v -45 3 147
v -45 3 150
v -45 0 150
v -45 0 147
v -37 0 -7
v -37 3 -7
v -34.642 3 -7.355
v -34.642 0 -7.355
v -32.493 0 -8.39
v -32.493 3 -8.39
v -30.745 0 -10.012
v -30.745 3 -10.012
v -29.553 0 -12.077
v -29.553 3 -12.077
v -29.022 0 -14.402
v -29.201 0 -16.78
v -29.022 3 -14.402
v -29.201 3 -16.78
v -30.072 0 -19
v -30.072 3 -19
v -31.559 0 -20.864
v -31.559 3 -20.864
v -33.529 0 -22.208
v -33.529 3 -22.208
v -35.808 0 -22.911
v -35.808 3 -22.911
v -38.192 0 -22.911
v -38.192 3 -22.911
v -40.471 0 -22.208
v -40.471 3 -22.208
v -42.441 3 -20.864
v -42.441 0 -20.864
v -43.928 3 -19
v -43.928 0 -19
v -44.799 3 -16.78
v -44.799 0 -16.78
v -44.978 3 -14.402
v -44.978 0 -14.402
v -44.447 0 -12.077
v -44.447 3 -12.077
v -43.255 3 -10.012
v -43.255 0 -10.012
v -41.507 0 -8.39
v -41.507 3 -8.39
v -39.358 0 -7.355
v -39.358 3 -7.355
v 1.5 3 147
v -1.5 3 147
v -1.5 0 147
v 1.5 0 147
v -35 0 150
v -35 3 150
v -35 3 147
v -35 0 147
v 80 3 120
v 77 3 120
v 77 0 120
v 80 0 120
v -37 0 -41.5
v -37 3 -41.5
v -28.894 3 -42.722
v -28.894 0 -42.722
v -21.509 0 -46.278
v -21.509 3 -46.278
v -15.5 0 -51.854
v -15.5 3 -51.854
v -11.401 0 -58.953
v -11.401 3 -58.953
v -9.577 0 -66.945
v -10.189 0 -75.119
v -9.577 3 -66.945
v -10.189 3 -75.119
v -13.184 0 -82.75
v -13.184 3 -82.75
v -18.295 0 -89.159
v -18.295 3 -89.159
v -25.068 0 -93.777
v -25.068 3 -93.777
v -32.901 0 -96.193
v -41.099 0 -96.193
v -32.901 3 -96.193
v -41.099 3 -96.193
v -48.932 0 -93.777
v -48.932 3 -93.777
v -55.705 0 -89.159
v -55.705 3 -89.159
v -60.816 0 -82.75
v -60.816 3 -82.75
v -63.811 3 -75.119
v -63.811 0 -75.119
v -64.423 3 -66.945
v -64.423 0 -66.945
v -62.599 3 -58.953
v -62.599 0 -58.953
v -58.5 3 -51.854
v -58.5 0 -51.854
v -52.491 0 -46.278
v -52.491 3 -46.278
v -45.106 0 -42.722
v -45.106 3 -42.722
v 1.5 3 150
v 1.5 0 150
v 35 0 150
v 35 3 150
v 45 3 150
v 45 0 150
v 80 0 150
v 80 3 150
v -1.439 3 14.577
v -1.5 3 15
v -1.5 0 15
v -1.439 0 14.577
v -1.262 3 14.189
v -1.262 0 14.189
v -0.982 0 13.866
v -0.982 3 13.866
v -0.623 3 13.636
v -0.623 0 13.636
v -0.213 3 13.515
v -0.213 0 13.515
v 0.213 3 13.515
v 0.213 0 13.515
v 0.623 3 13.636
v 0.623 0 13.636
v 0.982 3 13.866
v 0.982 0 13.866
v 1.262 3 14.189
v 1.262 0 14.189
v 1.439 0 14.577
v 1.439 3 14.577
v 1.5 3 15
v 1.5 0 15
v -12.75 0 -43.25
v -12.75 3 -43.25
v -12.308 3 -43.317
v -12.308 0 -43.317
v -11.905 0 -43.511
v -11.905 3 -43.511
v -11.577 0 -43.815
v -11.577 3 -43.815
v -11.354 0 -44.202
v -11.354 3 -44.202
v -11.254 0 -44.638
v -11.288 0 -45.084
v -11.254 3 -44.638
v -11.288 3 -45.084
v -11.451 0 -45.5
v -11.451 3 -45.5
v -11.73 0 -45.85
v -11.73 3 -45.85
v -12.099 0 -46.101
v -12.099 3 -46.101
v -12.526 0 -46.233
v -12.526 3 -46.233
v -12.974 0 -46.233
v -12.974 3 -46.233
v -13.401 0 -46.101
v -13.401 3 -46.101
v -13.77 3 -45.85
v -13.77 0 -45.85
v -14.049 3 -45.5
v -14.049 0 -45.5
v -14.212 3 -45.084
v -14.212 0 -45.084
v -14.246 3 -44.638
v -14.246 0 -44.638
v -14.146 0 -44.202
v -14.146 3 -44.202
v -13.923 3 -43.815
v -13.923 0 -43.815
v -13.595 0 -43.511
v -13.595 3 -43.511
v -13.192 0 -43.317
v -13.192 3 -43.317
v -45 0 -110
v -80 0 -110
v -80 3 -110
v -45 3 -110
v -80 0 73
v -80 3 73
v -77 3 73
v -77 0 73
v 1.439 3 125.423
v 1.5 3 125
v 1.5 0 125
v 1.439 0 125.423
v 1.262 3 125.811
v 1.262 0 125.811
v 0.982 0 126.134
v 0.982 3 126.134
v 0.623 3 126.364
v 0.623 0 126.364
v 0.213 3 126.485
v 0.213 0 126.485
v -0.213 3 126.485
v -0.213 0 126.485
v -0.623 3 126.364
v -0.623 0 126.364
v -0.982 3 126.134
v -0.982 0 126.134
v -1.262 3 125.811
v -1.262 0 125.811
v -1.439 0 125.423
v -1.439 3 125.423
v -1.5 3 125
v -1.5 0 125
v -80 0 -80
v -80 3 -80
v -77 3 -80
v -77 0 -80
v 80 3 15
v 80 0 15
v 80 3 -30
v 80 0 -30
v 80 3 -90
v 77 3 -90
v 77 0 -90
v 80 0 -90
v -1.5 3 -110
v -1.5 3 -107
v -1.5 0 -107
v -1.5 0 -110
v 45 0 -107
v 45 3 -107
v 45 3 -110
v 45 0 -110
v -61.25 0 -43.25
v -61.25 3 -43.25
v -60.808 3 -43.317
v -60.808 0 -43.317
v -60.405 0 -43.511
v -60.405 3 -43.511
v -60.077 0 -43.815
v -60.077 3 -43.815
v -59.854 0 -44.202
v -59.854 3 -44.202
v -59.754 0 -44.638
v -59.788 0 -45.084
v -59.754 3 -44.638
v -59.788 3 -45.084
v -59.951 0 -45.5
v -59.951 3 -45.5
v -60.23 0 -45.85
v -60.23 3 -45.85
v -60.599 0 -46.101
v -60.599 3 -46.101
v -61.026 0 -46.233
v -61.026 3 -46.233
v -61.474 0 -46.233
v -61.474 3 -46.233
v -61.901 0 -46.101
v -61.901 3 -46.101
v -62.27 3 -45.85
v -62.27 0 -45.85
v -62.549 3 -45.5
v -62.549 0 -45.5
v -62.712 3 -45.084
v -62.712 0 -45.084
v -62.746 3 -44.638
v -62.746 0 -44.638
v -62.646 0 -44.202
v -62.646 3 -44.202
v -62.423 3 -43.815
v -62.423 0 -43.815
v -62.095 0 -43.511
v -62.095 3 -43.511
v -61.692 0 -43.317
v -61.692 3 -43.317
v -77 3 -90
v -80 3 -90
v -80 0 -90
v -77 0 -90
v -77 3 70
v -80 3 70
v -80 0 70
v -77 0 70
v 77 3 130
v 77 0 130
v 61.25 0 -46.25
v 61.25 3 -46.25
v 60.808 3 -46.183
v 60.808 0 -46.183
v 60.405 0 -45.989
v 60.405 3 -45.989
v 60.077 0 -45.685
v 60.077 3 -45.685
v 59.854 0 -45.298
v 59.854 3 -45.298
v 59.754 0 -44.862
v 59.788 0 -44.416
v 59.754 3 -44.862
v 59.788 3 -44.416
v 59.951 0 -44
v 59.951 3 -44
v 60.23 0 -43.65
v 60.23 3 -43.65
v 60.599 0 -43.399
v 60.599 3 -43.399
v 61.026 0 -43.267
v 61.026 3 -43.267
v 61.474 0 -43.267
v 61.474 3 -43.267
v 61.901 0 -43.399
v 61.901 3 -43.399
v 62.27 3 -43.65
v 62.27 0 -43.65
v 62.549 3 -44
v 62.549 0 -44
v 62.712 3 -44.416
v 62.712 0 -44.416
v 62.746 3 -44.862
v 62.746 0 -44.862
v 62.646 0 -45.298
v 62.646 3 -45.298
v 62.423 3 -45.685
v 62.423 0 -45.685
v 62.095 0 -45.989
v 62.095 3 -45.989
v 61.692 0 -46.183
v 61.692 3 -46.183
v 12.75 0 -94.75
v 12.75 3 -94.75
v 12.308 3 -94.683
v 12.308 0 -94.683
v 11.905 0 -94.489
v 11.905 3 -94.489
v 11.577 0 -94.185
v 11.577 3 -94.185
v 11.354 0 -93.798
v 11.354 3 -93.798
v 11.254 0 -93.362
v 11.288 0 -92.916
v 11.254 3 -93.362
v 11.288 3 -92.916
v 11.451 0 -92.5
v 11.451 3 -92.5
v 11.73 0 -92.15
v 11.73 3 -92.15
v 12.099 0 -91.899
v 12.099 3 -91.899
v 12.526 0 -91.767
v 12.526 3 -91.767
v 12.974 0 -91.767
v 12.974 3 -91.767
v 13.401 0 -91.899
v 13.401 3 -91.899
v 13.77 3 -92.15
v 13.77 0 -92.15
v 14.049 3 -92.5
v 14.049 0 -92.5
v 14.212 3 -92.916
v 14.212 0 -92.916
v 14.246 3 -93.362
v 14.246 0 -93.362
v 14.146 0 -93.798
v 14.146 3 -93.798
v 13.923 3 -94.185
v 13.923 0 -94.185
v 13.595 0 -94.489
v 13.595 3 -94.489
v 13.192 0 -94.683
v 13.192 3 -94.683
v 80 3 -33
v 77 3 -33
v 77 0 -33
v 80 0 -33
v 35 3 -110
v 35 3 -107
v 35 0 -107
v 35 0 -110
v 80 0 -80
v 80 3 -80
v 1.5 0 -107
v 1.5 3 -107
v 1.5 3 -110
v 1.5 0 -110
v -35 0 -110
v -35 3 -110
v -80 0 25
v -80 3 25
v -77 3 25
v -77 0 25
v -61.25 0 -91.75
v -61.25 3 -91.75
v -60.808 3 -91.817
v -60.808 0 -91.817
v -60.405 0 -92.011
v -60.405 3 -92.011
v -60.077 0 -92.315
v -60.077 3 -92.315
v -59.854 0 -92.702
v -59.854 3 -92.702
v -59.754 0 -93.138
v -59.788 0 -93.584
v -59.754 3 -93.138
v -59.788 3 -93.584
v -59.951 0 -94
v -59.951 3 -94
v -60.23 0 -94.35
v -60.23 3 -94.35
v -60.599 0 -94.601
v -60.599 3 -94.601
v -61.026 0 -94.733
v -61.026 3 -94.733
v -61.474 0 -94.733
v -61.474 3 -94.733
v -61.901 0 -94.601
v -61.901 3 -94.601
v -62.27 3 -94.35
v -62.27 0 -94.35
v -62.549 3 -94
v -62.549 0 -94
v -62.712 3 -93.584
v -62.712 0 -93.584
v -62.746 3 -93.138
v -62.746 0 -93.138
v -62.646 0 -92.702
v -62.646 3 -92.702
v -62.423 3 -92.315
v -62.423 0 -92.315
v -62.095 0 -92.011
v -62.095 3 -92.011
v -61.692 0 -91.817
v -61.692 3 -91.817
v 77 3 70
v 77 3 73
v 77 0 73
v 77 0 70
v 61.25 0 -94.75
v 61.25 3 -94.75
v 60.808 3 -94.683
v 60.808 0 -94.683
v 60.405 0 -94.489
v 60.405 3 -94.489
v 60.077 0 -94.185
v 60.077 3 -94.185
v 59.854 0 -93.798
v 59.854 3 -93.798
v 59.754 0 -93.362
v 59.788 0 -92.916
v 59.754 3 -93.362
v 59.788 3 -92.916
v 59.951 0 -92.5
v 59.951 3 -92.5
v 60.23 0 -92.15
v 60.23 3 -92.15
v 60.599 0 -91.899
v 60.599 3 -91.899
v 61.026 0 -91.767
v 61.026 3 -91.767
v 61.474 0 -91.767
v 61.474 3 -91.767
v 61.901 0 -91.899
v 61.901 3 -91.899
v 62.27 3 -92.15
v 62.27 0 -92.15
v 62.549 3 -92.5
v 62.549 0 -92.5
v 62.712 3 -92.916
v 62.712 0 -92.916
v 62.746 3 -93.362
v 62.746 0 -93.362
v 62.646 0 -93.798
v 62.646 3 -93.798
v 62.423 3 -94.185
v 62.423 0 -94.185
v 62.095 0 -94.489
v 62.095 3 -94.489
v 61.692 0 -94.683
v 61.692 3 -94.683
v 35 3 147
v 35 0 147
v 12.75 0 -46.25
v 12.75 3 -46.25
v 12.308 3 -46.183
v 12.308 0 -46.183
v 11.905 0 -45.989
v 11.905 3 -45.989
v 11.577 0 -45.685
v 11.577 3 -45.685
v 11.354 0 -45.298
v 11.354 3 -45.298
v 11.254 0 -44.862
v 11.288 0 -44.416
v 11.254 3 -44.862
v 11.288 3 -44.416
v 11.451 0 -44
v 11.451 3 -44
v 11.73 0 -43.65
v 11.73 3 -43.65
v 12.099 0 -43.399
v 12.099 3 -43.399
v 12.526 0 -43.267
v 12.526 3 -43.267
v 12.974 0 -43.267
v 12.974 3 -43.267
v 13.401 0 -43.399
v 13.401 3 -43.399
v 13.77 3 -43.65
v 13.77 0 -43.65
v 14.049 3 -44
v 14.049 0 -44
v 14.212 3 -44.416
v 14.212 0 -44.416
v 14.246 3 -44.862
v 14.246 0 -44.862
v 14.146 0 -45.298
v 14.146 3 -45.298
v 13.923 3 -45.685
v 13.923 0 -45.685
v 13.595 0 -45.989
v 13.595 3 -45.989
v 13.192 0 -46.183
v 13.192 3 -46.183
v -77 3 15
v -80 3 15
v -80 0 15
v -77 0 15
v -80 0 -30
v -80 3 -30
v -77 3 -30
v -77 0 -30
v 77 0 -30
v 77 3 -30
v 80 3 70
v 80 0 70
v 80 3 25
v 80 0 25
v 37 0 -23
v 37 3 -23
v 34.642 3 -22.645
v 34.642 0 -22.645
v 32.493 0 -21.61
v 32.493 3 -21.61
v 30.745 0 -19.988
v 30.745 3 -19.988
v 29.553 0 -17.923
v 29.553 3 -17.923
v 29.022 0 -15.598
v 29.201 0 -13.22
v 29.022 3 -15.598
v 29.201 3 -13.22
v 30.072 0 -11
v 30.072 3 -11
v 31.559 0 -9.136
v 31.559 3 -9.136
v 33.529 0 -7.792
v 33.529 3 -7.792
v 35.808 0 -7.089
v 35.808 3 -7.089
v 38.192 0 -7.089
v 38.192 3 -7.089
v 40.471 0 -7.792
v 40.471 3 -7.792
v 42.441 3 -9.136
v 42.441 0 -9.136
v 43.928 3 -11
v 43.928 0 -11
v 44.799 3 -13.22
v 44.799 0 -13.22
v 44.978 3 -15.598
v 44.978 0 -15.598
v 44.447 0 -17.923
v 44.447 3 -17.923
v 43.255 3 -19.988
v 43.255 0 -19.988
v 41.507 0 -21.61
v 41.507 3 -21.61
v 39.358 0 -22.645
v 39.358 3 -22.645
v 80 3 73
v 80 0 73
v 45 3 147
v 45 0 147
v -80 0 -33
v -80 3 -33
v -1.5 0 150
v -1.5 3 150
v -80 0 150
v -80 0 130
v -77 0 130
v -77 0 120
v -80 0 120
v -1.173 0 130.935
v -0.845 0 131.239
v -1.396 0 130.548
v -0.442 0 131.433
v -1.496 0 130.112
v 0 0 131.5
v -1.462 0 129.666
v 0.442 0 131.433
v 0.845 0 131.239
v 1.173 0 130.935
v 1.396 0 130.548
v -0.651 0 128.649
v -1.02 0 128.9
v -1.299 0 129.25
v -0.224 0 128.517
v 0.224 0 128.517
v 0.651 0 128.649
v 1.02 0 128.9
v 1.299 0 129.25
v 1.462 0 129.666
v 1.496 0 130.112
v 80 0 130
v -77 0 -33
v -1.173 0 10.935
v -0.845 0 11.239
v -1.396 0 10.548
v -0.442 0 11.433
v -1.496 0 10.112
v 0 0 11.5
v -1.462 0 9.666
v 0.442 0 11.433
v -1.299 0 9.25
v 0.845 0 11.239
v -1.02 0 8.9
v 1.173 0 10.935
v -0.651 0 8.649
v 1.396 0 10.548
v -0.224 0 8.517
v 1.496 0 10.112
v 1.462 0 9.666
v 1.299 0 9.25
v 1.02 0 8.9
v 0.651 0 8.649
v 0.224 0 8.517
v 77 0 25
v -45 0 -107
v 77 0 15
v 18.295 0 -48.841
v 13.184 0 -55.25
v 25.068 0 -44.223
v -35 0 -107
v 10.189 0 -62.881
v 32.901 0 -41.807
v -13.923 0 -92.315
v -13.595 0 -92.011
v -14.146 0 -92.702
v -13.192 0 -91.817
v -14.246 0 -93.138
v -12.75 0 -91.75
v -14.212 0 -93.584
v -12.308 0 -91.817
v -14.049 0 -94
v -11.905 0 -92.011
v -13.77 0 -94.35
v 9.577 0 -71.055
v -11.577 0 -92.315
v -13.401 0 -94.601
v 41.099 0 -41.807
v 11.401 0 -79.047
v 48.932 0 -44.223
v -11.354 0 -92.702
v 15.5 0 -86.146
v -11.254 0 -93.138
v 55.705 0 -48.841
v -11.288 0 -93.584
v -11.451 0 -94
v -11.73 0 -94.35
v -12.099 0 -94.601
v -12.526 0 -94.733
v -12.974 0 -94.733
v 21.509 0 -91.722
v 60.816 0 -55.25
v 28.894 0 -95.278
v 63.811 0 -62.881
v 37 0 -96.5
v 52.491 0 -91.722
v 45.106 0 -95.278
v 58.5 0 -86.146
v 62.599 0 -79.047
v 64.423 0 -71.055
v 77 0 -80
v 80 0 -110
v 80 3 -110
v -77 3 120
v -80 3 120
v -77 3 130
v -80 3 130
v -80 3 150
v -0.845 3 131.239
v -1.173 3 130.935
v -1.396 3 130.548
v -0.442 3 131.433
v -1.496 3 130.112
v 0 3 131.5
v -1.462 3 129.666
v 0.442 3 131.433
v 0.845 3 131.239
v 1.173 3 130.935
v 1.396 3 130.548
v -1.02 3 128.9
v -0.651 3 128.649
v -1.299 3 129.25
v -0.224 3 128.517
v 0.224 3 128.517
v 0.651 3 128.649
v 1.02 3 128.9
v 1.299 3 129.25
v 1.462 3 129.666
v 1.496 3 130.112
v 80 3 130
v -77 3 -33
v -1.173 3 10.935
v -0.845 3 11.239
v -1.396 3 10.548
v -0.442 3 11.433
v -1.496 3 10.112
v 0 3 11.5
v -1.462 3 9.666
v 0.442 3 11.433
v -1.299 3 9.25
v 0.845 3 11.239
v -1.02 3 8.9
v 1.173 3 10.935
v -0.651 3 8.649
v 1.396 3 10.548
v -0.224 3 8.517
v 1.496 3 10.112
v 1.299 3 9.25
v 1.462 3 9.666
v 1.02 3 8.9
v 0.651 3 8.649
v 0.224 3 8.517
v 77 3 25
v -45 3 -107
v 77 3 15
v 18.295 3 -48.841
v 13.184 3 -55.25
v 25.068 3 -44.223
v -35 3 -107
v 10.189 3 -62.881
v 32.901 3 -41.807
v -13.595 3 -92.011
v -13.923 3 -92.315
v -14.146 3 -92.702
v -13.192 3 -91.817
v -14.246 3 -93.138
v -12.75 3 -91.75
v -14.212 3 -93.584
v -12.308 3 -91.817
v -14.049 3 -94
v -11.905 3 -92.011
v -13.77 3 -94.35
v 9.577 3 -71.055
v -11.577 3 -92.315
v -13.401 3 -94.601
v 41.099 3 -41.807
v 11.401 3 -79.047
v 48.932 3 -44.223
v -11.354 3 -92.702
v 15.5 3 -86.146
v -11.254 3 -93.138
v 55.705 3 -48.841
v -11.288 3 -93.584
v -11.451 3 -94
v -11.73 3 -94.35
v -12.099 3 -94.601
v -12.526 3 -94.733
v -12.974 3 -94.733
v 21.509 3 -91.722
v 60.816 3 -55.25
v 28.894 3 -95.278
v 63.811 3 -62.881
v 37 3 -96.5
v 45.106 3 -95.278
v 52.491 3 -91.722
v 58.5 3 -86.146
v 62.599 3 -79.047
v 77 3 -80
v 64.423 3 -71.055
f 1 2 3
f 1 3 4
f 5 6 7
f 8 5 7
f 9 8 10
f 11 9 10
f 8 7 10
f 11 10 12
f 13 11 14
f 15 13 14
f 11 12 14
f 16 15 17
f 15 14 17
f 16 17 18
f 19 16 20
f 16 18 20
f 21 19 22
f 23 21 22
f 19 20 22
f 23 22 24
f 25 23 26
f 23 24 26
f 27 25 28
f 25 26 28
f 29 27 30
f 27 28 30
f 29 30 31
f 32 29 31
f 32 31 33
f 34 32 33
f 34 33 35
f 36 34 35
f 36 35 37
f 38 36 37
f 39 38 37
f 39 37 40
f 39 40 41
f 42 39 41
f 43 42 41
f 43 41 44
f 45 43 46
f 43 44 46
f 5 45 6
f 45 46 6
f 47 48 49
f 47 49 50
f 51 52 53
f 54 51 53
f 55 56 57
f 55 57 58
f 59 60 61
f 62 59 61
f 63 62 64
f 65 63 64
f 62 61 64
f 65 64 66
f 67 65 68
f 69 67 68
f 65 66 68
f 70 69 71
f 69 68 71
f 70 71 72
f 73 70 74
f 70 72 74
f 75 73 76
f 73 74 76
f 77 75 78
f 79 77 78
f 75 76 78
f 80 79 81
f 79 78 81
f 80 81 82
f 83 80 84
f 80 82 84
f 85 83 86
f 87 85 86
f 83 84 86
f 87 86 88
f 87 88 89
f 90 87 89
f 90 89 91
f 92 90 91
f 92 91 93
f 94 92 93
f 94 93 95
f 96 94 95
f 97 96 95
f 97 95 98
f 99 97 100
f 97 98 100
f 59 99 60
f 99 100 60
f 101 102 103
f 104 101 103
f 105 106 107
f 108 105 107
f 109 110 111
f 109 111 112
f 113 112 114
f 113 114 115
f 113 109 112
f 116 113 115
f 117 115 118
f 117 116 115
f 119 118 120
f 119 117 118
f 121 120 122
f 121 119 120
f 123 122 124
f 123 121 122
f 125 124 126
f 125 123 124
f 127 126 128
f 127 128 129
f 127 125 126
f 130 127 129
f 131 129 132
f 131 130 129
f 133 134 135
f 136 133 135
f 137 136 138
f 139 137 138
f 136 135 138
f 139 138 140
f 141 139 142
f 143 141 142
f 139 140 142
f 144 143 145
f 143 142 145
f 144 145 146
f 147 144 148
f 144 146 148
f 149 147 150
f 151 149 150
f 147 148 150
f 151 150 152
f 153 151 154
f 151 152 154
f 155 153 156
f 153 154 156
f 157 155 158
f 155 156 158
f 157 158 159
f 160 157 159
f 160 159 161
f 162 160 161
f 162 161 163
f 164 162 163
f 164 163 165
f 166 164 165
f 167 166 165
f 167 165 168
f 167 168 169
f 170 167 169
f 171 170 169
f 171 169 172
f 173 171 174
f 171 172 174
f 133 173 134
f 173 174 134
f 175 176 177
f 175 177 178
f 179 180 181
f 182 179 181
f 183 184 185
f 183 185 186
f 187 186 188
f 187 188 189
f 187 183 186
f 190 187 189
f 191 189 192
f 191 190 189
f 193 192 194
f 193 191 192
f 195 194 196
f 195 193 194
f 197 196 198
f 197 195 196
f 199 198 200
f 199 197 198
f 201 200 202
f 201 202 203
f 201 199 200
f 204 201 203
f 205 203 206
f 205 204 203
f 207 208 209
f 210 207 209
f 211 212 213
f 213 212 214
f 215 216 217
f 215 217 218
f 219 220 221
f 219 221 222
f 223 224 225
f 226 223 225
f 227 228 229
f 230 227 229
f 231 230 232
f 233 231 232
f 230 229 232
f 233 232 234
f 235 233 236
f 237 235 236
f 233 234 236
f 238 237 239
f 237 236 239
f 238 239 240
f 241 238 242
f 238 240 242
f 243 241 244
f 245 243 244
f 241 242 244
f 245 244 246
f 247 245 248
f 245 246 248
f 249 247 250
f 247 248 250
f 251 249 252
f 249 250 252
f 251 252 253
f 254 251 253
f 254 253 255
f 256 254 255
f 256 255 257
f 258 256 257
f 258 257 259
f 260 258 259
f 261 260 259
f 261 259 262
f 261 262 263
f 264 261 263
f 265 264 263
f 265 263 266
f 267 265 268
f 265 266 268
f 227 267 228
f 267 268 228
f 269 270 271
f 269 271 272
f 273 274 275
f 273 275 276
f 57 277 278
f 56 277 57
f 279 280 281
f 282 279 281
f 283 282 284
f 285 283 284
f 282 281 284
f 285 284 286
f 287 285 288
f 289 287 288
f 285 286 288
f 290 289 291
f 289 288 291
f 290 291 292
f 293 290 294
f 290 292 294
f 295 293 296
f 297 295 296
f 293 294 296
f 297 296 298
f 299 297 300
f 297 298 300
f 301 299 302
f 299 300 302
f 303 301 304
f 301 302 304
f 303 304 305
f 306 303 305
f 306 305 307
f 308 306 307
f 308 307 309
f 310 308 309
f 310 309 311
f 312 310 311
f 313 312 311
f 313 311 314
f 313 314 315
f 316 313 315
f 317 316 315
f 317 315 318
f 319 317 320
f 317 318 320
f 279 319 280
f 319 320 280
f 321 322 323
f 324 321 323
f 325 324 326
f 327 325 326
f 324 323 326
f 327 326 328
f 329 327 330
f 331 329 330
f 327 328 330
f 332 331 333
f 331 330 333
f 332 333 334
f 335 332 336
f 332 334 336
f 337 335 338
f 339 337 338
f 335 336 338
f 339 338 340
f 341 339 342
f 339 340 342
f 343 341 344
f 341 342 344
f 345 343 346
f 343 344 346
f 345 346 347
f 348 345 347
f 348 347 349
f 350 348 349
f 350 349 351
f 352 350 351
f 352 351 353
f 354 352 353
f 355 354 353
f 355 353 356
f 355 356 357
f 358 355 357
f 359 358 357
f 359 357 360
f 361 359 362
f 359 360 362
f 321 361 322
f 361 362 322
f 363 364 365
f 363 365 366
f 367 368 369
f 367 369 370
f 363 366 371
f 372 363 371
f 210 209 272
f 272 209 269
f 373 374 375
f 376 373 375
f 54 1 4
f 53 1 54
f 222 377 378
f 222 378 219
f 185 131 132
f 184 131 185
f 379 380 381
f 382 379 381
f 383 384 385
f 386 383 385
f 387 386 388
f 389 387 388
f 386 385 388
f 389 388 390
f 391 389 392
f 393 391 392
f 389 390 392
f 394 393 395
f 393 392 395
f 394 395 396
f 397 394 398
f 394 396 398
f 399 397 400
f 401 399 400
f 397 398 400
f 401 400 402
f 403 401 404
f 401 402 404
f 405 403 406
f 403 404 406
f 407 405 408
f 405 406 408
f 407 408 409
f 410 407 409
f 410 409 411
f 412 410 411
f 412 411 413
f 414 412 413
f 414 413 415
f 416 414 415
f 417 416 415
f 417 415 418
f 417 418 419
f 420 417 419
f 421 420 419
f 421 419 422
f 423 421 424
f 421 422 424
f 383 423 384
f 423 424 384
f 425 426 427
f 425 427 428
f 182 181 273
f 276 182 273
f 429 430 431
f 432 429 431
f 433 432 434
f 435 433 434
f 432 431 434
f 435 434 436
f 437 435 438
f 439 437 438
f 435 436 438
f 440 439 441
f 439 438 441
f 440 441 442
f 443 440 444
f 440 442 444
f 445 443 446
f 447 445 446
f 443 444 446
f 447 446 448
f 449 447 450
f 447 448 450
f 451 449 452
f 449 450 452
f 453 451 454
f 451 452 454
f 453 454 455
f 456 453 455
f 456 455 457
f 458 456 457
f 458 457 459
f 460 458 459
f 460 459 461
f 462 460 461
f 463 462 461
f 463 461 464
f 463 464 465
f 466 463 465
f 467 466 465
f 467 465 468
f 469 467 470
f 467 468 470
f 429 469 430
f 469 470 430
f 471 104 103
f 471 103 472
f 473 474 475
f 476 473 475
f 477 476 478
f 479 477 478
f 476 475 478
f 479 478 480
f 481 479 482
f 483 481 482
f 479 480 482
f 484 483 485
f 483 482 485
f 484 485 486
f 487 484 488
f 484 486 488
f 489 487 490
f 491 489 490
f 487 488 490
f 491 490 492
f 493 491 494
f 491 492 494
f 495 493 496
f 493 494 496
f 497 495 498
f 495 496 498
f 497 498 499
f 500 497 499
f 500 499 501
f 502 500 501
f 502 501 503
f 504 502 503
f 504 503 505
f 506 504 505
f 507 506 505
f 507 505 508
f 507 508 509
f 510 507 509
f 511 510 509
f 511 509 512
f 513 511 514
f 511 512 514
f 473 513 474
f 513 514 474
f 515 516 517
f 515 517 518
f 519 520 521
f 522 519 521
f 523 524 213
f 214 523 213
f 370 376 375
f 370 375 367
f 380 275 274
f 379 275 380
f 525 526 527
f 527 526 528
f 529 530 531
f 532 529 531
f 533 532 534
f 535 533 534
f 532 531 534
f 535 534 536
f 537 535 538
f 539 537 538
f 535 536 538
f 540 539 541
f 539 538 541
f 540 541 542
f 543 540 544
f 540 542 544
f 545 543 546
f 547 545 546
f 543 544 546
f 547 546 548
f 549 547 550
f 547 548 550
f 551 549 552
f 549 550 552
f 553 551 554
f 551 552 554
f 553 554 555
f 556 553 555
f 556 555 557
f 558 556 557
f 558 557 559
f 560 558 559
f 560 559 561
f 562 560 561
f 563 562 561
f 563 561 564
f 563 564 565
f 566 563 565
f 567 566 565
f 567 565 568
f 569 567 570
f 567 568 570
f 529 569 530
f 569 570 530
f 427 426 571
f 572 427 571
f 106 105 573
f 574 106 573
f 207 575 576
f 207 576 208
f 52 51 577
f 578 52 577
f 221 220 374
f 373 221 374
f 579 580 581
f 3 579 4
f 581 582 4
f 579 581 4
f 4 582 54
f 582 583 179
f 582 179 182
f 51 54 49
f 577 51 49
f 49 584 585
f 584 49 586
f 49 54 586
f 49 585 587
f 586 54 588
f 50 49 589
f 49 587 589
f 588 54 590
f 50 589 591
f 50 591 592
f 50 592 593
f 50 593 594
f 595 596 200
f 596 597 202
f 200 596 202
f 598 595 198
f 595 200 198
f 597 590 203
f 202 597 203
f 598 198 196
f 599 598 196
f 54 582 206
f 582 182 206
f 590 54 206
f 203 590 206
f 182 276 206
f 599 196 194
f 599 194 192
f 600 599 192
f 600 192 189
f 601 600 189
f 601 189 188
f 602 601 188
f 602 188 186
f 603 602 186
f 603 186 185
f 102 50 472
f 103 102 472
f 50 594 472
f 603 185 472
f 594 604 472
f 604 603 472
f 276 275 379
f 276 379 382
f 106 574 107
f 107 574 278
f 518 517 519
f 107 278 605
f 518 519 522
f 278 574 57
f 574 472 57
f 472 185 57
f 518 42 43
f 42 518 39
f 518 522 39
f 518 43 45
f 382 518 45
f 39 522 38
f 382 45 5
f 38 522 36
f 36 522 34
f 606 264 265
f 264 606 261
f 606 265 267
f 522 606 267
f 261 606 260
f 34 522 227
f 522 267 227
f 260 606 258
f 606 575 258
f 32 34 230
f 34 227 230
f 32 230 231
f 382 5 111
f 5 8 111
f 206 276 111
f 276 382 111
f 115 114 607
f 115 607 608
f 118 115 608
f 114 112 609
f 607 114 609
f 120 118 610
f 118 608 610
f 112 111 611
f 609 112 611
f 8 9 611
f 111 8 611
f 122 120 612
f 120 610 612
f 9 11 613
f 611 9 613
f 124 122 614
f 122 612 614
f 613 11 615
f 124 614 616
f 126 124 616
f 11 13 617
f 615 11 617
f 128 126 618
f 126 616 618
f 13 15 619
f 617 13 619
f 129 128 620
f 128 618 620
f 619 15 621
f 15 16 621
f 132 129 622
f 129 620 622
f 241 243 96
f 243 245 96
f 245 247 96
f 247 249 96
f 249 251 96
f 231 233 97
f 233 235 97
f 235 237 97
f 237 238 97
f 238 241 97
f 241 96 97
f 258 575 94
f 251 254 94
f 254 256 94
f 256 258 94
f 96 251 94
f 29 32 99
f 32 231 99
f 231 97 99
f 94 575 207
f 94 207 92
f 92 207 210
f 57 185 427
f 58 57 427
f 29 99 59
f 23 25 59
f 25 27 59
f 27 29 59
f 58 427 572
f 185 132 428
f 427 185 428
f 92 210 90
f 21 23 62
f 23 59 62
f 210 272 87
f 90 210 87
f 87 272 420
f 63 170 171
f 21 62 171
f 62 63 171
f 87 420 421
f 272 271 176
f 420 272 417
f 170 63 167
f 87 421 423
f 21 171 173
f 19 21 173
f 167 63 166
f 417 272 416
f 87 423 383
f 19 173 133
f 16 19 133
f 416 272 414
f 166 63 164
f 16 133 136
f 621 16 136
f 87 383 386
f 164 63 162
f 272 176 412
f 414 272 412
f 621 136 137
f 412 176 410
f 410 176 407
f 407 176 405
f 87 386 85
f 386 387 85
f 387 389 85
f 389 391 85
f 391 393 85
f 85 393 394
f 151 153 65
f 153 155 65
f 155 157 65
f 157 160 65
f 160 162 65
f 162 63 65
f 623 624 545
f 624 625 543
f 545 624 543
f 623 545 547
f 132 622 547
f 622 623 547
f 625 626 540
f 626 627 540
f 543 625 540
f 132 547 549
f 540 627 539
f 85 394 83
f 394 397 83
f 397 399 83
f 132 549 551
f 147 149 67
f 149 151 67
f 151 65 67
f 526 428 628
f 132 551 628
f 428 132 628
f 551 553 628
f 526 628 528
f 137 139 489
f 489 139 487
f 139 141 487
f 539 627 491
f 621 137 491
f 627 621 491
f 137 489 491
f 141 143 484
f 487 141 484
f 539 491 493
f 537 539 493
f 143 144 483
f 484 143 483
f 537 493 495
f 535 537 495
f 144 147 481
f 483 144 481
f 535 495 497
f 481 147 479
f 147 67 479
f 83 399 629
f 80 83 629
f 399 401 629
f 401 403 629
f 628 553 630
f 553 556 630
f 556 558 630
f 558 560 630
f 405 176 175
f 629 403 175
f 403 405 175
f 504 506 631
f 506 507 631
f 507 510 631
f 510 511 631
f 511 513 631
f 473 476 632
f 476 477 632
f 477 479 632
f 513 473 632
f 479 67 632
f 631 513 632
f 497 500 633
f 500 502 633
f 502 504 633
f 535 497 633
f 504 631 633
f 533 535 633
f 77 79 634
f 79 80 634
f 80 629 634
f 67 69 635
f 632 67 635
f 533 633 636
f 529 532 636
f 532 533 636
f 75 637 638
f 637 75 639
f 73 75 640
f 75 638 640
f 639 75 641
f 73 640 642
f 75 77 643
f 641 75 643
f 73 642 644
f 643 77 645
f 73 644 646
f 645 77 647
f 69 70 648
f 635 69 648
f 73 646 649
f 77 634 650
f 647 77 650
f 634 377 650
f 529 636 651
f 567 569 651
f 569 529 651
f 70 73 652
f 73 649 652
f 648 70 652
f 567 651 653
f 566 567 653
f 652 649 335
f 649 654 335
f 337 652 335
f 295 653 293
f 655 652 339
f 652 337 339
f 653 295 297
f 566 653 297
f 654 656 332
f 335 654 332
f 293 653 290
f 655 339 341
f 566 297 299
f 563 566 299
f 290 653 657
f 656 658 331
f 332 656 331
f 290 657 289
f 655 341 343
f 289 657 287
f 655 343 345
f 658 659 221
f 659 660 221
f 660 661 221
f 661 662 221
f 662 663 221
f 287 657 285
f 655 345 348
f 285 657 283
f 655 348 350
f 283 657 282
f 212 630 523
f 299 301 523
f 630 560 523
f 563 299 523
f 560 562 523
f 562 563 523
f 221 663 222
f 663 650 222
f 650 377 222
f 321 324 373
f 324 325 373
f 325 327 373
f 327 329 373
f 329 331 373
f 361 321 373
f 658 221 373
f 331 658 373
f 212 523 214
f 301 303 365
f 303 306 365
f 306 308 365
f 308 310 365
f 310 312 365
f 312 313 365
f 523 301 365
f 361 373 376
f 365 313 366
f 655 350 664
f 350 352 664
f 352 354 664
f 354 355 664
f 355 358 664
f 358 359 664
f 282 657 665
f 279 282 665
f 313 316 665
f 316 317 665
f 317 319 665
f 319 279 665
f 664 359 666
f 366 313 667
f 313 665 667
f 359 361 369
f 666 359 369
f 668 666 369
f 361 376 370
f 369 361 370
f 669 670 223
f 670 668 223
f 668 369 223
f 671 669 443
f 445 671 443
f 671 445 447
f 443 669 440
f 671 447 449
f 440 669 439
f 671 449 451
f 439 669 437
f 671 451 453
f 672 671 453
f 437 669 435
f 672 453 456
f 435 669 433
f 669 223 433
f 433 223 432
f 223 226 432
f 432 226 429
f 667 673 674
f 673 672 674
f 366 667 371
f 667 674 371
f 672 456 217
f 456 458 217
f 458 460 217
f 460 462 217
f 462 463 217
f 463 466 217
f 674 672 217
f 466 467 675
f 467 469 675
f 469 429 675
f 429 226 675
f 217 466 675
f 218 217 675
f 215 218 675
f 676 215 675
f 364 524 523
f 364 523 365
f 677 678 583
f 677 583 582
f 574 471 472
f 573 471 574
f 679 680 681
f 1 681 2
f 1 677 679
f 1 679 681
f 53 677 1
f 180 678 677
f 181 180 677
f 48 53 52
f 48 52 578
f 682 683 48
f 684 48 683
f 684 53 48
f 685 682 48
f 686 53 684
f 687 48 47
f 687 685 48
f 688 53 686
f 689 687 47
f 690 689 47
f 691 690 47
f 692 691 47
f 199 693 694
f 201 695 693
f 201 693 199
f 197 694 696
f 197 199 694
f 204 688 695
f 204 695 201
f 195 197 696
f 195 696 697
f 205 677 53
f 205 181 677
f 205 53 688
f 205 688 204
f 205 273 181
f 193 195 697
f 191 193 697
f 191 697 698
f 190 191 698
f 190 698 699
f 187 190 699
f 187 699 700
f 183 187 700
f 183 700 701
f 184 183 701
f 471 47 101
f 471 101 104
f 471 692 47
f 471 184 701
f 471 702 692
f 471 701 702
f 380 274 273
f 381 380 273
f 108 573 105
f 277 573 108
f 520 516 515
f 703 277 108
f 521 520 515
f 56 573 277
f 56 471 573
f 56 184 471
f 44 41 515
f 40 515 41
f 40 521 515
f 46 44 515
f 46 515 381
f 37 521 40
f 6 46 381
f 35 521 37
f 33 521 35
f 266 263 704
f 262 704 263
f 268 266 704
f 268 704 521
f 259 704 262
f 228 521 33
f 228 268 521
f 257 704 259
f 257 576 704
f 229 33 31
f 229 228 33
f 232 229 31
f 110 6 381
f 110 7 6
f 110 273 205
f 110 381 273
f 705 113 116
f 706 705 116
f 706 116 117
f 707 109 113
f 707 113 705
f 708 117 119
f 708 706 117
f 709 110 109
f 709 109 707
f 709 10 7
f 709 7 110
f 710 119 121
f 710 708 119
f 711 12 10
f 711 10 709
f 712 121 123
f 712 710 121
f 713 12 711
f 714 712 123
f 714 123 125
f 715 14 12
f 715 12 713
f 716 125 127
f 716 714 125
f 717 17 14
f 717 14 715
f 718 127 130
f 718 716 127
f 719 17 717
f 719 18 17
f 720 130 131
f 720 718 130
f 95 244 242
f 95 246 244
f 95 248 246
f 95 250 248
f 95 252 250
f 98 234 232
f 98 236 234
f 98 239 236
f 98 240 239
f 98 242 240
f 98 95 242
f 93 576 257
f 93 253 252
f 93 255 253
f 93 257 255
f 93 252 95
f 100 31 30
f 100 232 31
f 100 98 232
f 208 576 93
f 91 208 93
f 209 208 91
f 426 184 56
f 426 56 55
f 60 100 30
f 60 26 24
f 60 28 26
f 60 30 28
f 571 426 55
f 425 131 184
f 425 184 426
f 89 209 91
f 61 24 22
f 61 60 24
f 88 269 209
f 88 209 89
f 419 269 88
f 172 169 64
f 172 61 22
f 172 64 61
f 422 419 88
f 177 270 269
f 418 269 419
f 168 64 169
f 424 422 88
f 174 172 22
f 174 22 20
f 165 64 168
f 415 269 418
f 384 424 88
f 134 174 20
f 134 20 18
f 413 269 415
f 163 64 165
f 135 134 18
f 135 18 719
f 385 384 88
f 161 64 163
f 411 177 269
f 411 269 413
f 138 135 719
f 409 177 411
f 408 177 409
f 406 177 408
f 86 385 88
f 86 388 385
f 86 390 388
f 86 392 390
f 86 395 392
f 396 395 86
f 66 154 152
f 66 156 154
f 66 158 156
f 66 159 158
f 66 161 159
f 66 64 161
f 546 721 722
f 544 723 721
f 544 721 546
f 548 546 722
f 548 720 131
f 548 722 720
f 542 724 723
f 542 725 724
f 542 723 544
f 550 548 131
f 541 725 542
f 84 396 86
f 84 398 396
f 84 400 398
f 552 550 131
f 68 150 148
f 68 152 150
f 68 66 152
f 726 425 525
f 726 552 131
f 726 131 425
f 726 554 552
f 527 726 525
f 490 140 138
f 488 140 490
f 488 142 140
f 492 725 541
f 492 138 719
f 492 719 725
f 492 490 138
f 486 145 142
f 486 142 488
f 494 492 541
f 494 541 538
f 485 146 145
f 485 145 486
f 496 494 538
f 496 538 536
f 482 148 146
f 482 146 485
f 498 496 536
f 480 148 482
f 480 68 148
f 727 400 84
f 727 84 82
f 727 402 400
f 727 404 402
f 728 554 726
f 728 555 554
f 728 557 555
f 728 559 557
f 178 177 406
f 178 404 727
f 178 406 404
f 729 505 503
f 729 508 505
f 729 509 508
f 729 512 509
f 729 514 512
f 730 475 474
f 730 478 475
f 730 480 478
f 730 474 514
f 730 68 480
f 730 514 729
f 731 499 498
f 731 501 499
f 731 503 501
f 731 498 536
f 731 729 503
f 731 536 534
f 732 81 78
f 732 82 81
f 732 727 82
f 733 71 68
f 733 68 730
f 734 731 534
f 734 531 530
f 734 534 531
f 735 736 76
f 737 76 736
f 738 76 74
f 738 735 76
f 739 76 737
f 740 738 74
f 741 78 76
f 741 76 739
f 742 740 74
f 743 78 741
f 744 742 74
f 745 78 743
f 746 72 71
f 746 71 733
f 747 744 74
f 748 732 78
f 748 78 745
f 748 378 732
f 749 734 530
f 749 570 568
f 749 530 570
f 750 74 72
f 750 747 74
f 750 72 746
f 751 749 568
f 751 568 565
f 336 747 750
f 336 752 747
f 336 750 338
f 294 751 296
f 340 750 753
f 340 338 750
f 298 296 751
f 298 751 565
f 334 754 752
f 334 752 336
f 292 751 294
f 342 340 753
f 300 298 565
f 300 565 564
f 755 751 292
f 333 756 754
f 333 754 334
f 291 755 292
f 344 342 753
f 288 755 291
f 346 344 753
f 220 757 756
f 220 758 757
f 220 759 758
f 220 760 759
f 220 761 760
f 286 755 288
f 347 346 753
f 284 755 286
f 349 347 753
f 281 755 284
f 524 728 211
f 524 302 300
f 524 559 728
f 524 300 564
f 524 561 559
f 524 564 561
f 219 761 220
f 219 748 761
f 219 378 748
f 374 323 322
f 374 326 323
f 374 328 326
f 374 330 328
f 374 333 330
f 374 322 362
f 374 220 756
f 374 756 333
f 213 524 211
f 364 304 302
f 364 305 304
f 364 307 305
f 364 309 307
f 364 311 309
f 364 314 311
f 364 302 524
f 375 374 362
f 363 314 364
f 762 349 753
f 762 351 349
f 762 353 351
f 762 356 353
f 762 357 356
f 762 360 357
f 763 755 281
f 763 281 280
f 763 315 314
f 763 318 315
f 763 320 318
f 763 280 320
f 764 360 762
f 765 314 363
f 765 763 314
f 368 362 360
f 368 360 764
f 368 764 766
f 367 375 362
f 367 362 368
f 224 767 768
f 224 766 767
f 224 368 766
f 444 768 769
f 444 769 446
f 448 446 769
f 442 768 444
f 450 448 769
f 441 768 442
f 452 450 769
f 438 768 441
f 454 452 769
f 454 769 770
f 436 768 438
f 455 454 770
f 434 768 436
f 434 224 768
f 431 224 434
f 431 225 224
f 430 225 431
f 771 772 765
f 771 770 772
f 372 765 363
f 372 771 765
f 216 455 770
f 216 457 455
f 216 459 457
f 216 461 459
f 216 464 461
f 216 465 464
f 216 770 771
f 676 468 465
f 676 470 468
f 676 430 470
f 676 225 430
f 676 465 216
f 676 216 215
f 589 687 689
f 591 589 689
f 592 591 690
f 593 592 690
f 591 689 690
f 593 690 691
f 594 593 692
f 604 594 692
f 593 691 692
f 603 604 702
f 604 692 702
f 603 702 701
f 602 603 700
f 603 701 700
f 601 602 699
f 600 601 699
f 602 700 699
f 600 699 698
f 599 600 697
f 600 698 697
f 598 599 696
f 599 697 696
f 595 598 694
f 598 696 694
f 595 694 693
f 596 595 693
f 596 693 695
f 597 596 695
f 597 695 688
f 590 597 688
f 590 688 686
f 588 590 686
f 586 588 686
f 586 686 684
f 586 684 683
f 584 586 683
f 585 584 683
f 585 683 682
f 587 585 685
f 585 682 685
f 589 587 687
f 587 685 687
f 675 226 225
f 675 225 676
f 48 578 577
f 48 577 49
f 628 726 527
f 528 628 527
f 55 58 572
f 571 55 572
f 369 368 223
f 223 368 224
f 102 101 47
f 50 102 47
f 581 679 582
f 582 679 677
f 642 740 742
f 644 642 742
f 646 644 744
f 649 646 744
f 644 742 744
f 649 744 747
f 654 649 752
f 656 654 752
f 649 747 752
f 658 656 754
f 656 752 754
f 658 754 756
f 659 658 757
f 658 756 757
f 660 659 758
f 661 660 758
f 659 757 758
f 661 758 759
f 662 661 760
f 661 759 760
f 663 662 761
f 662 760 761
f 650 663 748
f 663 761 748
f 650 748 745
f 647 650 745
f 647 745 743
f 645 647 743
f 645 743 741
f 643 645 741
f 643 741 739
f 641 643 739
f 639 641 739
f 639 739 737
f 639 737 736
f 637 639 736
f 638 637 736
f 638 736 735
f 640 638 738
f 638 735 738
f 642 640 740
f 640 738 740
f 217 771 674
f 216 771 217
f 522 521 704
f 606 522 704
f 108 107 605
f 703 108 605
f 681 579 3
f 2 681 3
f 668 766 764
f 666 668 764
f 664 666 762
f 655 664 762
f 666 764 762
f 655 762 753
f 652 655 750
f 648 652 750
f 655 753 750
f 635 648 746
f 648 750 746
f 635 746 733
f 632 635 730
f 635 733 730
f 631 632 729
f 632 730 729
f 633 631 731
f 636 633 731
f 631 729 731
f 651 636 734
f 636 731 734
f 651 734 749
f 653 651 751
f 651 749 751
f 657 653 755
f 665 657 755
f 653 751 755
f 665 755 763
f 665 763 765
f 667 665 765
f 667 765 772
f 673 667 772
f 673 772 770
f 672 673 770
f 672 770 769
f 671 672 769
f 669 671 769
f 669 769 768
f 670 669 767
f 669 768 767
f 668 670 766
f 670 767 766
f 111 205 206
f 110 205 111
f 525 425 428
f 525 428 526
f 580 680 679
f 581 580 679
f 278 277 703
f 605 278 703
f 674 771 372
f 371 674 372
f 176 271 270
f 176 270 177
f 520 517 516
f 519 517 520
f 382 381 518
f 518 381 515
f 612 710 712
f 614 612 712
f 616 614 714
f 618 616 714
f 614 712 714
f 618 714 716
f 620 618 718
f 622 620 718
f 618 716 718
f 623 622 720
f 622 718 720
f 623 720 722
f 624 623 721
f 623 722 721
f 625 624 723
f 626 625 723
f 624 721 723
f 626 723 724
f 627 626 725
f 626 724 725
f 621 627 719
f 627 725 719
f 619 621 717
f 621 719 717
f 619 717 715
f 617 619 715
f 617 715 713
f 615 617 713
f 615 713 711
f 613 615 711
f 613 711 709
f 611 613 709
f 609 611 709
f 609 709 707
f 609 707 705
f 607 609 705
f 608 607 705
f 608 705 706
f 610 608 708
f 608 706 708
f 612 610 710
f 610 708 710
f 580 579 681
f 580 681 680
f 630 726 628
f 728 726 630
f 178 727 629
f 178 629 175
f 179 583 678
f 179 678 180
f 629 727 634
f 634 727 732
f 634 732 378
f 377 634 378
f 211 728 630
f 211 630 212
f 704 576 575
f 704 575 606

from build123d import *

# Parameters (mm, degrees)
SKETCH1_W           = 160
SKETCH1_H           = 260
BOSS_EXTRUDE1_DEPTH = 3
SKETCH2_R           = 1.5
SKETCH2_R_2         = 8
SKETCH2_R_3         = 27.5
CUT_EXTRUDE1_DEPTH  = 3
SKETCH7_W           = 3
SKETCH7_H           = 3
SKETCH7_W_2         = 10
SKETCH7_H_2         = 10
CUT_EXTRUDE2_DEPTH  = 171.026468528


with BuildPart() as part:
    # Sketch1 → Boss-Extrude1 (new body)
    with BuildSketch(Plane(origin=(0, 0, 0), x_dir=(1, 0, 0), z_dir=(0, 1, 0))):
        with Locations((0, -20)):
            Rectangle(SKETCH1_W, SKETCH1_H)
    extrude(amount=BOSS_EXTRUDE1_DEPTH)

    # Sketch2 → Cut-Extrude1 (cut)
    with BuildSketch(Plane(origin=(0, 3, 0), x_dir=(1, 0, 0), z_dir=(0, 1, 0))):
        with Locations(Location((0, -10, 0), (0, 0, 270))):
            Circle(SKETCH2_R)
        with Locations(Location((0, -130, 0), (0, 0, 270))):
            Circle(SKETCH2_R)
        with Locations(Location((-37, 15, 0), (0, 0, 270))):
            Circle(SKETCH2_R_2)
        with Locations(Location((-12.75, 93.25, 0), (0, 0, 270))):
            Circle(SKETCH2_R)
        with Locations(Location((37, 15, 0), (0, 0, 90))):
            Circle(SKETCH2_R_2)
        with Locations(Location((-12.75, 44.75, 0), (0, 0, 270))):
            Circle(SKETCH2_R)
        with Locations(Location((-61.25, 44.75, 0), (0, 0, 270))):
            Circle(SKETCH2_R)
        with Locations(Location((-61.25, 93.25, 0), (0, 0, 270))):
            Circle(SKETCH2_R)
        with Locations(Location((37, 69, 0), (0, 0, 90))):
            Circle(SKETCH2_R_3)
        with Locations(Location((12.75, 44.75, 0), (0, 0, 90))):
            Circle(SKETCH2_R)
        with Locations(Location((61.25, 44.75, 0), (0, 0, 90))):
            Circle(SKETCH2_R)
        with Locations(Location((61.25, 93.25, 0), (0, 0, 90))):
            Circle(SKETCH2_R)
        with Locations(Location((-37, 69, 0), (0, 0, 270))):
            Circle(SKETCH2_R_3)
        with Locations(Location((12.75, 93.25, 0), (0, 0, 90))):
            Circle(SKETCH2_R)
        with BuildLine():
            Line((1.5, -15), (1.5, -125))
            ThreePointArc((1.5, -125), (0, -126.5), (-1.5, -125))
            Line((-1.5, -125), (-1.5, -15))
            ThreePointArc((-1.5, -15), (0, -13.5), (1.5, -15))
        make_face()
    extrude(amount=-CUT_EXTRUDE1_DEPTH, mode=Mode.SUBTRACT)

    # Sketch7 → Cut-Extrude2 (cut, through all)
    with BuildSketch(Plane(origin=(0, 3, 0), x_dir=(1, 0, 0), z_dir=(0, 1, 0))):
        with Locations((0, 108.5)):
            Rectangle(SKETCH7_W, SKETCH7_H)
        with Locations((40, 108.5)):
            Rectangle(SKETCH7_W_2, SKETCH7_H)
        with Locations((-40, 108.5)):
            Rectangle(SKETCH7_W_2, SKETCH7_H)
        with Locations((40, -148.5)):
            Rectangle(SKETCH7_W_2, SKETCH7_H)
        with Locations((-40, -148.5)):
            Rectangle(SKETCH7_W_2, SKETCH7_H)
        with Locations((0, -148.5)):
            Rectangle(SKETCH7_W, SKETCH7_H)
        with Locations((-78.5, -125)):
            Rectangle(SKETCH7_W, SKETCH7_H_2)
        with Locations((-78.5, -20)):
            Rectangle(SKETCH7_W, SKETCH7_H_2)
        with Locations((-78.5, 85)):
            Rectangle(SKETCH7_W, SKETCH7_H_2)
        with Locations((-78.5, -71.5)):
            Rectangle(SKETCH7_W, SKETCH7_H)
        with Locations((-78.5, 31.5)):
            Rectangle(SKETCH7_W, SKETCH7_H)
        with Locations((78.5, -125)):
            Rectangle(SKETCH7_W, SKETCH7_H_2)
        with Locations((78.5, -71.5)):
            Rectangle(SKETCH7_W, SKETCH7_H)
        with Locations((78.5, -20)):
            Rectangle(SKETCH7_W, SKETCH7_H_2)
        with Locations((78.5, 31.5)):
            Rectangle(SKETCH7_W, SKETCH7_H)
        with Locations((78.5, 85)):
            Rectangle(SKETCH7_W, SKETCH7_H_2)
    extrude(amount=-CUT_EXTRUDE2_DEPTH, mode=Mode.SUBTRACT)


solid = part.part
